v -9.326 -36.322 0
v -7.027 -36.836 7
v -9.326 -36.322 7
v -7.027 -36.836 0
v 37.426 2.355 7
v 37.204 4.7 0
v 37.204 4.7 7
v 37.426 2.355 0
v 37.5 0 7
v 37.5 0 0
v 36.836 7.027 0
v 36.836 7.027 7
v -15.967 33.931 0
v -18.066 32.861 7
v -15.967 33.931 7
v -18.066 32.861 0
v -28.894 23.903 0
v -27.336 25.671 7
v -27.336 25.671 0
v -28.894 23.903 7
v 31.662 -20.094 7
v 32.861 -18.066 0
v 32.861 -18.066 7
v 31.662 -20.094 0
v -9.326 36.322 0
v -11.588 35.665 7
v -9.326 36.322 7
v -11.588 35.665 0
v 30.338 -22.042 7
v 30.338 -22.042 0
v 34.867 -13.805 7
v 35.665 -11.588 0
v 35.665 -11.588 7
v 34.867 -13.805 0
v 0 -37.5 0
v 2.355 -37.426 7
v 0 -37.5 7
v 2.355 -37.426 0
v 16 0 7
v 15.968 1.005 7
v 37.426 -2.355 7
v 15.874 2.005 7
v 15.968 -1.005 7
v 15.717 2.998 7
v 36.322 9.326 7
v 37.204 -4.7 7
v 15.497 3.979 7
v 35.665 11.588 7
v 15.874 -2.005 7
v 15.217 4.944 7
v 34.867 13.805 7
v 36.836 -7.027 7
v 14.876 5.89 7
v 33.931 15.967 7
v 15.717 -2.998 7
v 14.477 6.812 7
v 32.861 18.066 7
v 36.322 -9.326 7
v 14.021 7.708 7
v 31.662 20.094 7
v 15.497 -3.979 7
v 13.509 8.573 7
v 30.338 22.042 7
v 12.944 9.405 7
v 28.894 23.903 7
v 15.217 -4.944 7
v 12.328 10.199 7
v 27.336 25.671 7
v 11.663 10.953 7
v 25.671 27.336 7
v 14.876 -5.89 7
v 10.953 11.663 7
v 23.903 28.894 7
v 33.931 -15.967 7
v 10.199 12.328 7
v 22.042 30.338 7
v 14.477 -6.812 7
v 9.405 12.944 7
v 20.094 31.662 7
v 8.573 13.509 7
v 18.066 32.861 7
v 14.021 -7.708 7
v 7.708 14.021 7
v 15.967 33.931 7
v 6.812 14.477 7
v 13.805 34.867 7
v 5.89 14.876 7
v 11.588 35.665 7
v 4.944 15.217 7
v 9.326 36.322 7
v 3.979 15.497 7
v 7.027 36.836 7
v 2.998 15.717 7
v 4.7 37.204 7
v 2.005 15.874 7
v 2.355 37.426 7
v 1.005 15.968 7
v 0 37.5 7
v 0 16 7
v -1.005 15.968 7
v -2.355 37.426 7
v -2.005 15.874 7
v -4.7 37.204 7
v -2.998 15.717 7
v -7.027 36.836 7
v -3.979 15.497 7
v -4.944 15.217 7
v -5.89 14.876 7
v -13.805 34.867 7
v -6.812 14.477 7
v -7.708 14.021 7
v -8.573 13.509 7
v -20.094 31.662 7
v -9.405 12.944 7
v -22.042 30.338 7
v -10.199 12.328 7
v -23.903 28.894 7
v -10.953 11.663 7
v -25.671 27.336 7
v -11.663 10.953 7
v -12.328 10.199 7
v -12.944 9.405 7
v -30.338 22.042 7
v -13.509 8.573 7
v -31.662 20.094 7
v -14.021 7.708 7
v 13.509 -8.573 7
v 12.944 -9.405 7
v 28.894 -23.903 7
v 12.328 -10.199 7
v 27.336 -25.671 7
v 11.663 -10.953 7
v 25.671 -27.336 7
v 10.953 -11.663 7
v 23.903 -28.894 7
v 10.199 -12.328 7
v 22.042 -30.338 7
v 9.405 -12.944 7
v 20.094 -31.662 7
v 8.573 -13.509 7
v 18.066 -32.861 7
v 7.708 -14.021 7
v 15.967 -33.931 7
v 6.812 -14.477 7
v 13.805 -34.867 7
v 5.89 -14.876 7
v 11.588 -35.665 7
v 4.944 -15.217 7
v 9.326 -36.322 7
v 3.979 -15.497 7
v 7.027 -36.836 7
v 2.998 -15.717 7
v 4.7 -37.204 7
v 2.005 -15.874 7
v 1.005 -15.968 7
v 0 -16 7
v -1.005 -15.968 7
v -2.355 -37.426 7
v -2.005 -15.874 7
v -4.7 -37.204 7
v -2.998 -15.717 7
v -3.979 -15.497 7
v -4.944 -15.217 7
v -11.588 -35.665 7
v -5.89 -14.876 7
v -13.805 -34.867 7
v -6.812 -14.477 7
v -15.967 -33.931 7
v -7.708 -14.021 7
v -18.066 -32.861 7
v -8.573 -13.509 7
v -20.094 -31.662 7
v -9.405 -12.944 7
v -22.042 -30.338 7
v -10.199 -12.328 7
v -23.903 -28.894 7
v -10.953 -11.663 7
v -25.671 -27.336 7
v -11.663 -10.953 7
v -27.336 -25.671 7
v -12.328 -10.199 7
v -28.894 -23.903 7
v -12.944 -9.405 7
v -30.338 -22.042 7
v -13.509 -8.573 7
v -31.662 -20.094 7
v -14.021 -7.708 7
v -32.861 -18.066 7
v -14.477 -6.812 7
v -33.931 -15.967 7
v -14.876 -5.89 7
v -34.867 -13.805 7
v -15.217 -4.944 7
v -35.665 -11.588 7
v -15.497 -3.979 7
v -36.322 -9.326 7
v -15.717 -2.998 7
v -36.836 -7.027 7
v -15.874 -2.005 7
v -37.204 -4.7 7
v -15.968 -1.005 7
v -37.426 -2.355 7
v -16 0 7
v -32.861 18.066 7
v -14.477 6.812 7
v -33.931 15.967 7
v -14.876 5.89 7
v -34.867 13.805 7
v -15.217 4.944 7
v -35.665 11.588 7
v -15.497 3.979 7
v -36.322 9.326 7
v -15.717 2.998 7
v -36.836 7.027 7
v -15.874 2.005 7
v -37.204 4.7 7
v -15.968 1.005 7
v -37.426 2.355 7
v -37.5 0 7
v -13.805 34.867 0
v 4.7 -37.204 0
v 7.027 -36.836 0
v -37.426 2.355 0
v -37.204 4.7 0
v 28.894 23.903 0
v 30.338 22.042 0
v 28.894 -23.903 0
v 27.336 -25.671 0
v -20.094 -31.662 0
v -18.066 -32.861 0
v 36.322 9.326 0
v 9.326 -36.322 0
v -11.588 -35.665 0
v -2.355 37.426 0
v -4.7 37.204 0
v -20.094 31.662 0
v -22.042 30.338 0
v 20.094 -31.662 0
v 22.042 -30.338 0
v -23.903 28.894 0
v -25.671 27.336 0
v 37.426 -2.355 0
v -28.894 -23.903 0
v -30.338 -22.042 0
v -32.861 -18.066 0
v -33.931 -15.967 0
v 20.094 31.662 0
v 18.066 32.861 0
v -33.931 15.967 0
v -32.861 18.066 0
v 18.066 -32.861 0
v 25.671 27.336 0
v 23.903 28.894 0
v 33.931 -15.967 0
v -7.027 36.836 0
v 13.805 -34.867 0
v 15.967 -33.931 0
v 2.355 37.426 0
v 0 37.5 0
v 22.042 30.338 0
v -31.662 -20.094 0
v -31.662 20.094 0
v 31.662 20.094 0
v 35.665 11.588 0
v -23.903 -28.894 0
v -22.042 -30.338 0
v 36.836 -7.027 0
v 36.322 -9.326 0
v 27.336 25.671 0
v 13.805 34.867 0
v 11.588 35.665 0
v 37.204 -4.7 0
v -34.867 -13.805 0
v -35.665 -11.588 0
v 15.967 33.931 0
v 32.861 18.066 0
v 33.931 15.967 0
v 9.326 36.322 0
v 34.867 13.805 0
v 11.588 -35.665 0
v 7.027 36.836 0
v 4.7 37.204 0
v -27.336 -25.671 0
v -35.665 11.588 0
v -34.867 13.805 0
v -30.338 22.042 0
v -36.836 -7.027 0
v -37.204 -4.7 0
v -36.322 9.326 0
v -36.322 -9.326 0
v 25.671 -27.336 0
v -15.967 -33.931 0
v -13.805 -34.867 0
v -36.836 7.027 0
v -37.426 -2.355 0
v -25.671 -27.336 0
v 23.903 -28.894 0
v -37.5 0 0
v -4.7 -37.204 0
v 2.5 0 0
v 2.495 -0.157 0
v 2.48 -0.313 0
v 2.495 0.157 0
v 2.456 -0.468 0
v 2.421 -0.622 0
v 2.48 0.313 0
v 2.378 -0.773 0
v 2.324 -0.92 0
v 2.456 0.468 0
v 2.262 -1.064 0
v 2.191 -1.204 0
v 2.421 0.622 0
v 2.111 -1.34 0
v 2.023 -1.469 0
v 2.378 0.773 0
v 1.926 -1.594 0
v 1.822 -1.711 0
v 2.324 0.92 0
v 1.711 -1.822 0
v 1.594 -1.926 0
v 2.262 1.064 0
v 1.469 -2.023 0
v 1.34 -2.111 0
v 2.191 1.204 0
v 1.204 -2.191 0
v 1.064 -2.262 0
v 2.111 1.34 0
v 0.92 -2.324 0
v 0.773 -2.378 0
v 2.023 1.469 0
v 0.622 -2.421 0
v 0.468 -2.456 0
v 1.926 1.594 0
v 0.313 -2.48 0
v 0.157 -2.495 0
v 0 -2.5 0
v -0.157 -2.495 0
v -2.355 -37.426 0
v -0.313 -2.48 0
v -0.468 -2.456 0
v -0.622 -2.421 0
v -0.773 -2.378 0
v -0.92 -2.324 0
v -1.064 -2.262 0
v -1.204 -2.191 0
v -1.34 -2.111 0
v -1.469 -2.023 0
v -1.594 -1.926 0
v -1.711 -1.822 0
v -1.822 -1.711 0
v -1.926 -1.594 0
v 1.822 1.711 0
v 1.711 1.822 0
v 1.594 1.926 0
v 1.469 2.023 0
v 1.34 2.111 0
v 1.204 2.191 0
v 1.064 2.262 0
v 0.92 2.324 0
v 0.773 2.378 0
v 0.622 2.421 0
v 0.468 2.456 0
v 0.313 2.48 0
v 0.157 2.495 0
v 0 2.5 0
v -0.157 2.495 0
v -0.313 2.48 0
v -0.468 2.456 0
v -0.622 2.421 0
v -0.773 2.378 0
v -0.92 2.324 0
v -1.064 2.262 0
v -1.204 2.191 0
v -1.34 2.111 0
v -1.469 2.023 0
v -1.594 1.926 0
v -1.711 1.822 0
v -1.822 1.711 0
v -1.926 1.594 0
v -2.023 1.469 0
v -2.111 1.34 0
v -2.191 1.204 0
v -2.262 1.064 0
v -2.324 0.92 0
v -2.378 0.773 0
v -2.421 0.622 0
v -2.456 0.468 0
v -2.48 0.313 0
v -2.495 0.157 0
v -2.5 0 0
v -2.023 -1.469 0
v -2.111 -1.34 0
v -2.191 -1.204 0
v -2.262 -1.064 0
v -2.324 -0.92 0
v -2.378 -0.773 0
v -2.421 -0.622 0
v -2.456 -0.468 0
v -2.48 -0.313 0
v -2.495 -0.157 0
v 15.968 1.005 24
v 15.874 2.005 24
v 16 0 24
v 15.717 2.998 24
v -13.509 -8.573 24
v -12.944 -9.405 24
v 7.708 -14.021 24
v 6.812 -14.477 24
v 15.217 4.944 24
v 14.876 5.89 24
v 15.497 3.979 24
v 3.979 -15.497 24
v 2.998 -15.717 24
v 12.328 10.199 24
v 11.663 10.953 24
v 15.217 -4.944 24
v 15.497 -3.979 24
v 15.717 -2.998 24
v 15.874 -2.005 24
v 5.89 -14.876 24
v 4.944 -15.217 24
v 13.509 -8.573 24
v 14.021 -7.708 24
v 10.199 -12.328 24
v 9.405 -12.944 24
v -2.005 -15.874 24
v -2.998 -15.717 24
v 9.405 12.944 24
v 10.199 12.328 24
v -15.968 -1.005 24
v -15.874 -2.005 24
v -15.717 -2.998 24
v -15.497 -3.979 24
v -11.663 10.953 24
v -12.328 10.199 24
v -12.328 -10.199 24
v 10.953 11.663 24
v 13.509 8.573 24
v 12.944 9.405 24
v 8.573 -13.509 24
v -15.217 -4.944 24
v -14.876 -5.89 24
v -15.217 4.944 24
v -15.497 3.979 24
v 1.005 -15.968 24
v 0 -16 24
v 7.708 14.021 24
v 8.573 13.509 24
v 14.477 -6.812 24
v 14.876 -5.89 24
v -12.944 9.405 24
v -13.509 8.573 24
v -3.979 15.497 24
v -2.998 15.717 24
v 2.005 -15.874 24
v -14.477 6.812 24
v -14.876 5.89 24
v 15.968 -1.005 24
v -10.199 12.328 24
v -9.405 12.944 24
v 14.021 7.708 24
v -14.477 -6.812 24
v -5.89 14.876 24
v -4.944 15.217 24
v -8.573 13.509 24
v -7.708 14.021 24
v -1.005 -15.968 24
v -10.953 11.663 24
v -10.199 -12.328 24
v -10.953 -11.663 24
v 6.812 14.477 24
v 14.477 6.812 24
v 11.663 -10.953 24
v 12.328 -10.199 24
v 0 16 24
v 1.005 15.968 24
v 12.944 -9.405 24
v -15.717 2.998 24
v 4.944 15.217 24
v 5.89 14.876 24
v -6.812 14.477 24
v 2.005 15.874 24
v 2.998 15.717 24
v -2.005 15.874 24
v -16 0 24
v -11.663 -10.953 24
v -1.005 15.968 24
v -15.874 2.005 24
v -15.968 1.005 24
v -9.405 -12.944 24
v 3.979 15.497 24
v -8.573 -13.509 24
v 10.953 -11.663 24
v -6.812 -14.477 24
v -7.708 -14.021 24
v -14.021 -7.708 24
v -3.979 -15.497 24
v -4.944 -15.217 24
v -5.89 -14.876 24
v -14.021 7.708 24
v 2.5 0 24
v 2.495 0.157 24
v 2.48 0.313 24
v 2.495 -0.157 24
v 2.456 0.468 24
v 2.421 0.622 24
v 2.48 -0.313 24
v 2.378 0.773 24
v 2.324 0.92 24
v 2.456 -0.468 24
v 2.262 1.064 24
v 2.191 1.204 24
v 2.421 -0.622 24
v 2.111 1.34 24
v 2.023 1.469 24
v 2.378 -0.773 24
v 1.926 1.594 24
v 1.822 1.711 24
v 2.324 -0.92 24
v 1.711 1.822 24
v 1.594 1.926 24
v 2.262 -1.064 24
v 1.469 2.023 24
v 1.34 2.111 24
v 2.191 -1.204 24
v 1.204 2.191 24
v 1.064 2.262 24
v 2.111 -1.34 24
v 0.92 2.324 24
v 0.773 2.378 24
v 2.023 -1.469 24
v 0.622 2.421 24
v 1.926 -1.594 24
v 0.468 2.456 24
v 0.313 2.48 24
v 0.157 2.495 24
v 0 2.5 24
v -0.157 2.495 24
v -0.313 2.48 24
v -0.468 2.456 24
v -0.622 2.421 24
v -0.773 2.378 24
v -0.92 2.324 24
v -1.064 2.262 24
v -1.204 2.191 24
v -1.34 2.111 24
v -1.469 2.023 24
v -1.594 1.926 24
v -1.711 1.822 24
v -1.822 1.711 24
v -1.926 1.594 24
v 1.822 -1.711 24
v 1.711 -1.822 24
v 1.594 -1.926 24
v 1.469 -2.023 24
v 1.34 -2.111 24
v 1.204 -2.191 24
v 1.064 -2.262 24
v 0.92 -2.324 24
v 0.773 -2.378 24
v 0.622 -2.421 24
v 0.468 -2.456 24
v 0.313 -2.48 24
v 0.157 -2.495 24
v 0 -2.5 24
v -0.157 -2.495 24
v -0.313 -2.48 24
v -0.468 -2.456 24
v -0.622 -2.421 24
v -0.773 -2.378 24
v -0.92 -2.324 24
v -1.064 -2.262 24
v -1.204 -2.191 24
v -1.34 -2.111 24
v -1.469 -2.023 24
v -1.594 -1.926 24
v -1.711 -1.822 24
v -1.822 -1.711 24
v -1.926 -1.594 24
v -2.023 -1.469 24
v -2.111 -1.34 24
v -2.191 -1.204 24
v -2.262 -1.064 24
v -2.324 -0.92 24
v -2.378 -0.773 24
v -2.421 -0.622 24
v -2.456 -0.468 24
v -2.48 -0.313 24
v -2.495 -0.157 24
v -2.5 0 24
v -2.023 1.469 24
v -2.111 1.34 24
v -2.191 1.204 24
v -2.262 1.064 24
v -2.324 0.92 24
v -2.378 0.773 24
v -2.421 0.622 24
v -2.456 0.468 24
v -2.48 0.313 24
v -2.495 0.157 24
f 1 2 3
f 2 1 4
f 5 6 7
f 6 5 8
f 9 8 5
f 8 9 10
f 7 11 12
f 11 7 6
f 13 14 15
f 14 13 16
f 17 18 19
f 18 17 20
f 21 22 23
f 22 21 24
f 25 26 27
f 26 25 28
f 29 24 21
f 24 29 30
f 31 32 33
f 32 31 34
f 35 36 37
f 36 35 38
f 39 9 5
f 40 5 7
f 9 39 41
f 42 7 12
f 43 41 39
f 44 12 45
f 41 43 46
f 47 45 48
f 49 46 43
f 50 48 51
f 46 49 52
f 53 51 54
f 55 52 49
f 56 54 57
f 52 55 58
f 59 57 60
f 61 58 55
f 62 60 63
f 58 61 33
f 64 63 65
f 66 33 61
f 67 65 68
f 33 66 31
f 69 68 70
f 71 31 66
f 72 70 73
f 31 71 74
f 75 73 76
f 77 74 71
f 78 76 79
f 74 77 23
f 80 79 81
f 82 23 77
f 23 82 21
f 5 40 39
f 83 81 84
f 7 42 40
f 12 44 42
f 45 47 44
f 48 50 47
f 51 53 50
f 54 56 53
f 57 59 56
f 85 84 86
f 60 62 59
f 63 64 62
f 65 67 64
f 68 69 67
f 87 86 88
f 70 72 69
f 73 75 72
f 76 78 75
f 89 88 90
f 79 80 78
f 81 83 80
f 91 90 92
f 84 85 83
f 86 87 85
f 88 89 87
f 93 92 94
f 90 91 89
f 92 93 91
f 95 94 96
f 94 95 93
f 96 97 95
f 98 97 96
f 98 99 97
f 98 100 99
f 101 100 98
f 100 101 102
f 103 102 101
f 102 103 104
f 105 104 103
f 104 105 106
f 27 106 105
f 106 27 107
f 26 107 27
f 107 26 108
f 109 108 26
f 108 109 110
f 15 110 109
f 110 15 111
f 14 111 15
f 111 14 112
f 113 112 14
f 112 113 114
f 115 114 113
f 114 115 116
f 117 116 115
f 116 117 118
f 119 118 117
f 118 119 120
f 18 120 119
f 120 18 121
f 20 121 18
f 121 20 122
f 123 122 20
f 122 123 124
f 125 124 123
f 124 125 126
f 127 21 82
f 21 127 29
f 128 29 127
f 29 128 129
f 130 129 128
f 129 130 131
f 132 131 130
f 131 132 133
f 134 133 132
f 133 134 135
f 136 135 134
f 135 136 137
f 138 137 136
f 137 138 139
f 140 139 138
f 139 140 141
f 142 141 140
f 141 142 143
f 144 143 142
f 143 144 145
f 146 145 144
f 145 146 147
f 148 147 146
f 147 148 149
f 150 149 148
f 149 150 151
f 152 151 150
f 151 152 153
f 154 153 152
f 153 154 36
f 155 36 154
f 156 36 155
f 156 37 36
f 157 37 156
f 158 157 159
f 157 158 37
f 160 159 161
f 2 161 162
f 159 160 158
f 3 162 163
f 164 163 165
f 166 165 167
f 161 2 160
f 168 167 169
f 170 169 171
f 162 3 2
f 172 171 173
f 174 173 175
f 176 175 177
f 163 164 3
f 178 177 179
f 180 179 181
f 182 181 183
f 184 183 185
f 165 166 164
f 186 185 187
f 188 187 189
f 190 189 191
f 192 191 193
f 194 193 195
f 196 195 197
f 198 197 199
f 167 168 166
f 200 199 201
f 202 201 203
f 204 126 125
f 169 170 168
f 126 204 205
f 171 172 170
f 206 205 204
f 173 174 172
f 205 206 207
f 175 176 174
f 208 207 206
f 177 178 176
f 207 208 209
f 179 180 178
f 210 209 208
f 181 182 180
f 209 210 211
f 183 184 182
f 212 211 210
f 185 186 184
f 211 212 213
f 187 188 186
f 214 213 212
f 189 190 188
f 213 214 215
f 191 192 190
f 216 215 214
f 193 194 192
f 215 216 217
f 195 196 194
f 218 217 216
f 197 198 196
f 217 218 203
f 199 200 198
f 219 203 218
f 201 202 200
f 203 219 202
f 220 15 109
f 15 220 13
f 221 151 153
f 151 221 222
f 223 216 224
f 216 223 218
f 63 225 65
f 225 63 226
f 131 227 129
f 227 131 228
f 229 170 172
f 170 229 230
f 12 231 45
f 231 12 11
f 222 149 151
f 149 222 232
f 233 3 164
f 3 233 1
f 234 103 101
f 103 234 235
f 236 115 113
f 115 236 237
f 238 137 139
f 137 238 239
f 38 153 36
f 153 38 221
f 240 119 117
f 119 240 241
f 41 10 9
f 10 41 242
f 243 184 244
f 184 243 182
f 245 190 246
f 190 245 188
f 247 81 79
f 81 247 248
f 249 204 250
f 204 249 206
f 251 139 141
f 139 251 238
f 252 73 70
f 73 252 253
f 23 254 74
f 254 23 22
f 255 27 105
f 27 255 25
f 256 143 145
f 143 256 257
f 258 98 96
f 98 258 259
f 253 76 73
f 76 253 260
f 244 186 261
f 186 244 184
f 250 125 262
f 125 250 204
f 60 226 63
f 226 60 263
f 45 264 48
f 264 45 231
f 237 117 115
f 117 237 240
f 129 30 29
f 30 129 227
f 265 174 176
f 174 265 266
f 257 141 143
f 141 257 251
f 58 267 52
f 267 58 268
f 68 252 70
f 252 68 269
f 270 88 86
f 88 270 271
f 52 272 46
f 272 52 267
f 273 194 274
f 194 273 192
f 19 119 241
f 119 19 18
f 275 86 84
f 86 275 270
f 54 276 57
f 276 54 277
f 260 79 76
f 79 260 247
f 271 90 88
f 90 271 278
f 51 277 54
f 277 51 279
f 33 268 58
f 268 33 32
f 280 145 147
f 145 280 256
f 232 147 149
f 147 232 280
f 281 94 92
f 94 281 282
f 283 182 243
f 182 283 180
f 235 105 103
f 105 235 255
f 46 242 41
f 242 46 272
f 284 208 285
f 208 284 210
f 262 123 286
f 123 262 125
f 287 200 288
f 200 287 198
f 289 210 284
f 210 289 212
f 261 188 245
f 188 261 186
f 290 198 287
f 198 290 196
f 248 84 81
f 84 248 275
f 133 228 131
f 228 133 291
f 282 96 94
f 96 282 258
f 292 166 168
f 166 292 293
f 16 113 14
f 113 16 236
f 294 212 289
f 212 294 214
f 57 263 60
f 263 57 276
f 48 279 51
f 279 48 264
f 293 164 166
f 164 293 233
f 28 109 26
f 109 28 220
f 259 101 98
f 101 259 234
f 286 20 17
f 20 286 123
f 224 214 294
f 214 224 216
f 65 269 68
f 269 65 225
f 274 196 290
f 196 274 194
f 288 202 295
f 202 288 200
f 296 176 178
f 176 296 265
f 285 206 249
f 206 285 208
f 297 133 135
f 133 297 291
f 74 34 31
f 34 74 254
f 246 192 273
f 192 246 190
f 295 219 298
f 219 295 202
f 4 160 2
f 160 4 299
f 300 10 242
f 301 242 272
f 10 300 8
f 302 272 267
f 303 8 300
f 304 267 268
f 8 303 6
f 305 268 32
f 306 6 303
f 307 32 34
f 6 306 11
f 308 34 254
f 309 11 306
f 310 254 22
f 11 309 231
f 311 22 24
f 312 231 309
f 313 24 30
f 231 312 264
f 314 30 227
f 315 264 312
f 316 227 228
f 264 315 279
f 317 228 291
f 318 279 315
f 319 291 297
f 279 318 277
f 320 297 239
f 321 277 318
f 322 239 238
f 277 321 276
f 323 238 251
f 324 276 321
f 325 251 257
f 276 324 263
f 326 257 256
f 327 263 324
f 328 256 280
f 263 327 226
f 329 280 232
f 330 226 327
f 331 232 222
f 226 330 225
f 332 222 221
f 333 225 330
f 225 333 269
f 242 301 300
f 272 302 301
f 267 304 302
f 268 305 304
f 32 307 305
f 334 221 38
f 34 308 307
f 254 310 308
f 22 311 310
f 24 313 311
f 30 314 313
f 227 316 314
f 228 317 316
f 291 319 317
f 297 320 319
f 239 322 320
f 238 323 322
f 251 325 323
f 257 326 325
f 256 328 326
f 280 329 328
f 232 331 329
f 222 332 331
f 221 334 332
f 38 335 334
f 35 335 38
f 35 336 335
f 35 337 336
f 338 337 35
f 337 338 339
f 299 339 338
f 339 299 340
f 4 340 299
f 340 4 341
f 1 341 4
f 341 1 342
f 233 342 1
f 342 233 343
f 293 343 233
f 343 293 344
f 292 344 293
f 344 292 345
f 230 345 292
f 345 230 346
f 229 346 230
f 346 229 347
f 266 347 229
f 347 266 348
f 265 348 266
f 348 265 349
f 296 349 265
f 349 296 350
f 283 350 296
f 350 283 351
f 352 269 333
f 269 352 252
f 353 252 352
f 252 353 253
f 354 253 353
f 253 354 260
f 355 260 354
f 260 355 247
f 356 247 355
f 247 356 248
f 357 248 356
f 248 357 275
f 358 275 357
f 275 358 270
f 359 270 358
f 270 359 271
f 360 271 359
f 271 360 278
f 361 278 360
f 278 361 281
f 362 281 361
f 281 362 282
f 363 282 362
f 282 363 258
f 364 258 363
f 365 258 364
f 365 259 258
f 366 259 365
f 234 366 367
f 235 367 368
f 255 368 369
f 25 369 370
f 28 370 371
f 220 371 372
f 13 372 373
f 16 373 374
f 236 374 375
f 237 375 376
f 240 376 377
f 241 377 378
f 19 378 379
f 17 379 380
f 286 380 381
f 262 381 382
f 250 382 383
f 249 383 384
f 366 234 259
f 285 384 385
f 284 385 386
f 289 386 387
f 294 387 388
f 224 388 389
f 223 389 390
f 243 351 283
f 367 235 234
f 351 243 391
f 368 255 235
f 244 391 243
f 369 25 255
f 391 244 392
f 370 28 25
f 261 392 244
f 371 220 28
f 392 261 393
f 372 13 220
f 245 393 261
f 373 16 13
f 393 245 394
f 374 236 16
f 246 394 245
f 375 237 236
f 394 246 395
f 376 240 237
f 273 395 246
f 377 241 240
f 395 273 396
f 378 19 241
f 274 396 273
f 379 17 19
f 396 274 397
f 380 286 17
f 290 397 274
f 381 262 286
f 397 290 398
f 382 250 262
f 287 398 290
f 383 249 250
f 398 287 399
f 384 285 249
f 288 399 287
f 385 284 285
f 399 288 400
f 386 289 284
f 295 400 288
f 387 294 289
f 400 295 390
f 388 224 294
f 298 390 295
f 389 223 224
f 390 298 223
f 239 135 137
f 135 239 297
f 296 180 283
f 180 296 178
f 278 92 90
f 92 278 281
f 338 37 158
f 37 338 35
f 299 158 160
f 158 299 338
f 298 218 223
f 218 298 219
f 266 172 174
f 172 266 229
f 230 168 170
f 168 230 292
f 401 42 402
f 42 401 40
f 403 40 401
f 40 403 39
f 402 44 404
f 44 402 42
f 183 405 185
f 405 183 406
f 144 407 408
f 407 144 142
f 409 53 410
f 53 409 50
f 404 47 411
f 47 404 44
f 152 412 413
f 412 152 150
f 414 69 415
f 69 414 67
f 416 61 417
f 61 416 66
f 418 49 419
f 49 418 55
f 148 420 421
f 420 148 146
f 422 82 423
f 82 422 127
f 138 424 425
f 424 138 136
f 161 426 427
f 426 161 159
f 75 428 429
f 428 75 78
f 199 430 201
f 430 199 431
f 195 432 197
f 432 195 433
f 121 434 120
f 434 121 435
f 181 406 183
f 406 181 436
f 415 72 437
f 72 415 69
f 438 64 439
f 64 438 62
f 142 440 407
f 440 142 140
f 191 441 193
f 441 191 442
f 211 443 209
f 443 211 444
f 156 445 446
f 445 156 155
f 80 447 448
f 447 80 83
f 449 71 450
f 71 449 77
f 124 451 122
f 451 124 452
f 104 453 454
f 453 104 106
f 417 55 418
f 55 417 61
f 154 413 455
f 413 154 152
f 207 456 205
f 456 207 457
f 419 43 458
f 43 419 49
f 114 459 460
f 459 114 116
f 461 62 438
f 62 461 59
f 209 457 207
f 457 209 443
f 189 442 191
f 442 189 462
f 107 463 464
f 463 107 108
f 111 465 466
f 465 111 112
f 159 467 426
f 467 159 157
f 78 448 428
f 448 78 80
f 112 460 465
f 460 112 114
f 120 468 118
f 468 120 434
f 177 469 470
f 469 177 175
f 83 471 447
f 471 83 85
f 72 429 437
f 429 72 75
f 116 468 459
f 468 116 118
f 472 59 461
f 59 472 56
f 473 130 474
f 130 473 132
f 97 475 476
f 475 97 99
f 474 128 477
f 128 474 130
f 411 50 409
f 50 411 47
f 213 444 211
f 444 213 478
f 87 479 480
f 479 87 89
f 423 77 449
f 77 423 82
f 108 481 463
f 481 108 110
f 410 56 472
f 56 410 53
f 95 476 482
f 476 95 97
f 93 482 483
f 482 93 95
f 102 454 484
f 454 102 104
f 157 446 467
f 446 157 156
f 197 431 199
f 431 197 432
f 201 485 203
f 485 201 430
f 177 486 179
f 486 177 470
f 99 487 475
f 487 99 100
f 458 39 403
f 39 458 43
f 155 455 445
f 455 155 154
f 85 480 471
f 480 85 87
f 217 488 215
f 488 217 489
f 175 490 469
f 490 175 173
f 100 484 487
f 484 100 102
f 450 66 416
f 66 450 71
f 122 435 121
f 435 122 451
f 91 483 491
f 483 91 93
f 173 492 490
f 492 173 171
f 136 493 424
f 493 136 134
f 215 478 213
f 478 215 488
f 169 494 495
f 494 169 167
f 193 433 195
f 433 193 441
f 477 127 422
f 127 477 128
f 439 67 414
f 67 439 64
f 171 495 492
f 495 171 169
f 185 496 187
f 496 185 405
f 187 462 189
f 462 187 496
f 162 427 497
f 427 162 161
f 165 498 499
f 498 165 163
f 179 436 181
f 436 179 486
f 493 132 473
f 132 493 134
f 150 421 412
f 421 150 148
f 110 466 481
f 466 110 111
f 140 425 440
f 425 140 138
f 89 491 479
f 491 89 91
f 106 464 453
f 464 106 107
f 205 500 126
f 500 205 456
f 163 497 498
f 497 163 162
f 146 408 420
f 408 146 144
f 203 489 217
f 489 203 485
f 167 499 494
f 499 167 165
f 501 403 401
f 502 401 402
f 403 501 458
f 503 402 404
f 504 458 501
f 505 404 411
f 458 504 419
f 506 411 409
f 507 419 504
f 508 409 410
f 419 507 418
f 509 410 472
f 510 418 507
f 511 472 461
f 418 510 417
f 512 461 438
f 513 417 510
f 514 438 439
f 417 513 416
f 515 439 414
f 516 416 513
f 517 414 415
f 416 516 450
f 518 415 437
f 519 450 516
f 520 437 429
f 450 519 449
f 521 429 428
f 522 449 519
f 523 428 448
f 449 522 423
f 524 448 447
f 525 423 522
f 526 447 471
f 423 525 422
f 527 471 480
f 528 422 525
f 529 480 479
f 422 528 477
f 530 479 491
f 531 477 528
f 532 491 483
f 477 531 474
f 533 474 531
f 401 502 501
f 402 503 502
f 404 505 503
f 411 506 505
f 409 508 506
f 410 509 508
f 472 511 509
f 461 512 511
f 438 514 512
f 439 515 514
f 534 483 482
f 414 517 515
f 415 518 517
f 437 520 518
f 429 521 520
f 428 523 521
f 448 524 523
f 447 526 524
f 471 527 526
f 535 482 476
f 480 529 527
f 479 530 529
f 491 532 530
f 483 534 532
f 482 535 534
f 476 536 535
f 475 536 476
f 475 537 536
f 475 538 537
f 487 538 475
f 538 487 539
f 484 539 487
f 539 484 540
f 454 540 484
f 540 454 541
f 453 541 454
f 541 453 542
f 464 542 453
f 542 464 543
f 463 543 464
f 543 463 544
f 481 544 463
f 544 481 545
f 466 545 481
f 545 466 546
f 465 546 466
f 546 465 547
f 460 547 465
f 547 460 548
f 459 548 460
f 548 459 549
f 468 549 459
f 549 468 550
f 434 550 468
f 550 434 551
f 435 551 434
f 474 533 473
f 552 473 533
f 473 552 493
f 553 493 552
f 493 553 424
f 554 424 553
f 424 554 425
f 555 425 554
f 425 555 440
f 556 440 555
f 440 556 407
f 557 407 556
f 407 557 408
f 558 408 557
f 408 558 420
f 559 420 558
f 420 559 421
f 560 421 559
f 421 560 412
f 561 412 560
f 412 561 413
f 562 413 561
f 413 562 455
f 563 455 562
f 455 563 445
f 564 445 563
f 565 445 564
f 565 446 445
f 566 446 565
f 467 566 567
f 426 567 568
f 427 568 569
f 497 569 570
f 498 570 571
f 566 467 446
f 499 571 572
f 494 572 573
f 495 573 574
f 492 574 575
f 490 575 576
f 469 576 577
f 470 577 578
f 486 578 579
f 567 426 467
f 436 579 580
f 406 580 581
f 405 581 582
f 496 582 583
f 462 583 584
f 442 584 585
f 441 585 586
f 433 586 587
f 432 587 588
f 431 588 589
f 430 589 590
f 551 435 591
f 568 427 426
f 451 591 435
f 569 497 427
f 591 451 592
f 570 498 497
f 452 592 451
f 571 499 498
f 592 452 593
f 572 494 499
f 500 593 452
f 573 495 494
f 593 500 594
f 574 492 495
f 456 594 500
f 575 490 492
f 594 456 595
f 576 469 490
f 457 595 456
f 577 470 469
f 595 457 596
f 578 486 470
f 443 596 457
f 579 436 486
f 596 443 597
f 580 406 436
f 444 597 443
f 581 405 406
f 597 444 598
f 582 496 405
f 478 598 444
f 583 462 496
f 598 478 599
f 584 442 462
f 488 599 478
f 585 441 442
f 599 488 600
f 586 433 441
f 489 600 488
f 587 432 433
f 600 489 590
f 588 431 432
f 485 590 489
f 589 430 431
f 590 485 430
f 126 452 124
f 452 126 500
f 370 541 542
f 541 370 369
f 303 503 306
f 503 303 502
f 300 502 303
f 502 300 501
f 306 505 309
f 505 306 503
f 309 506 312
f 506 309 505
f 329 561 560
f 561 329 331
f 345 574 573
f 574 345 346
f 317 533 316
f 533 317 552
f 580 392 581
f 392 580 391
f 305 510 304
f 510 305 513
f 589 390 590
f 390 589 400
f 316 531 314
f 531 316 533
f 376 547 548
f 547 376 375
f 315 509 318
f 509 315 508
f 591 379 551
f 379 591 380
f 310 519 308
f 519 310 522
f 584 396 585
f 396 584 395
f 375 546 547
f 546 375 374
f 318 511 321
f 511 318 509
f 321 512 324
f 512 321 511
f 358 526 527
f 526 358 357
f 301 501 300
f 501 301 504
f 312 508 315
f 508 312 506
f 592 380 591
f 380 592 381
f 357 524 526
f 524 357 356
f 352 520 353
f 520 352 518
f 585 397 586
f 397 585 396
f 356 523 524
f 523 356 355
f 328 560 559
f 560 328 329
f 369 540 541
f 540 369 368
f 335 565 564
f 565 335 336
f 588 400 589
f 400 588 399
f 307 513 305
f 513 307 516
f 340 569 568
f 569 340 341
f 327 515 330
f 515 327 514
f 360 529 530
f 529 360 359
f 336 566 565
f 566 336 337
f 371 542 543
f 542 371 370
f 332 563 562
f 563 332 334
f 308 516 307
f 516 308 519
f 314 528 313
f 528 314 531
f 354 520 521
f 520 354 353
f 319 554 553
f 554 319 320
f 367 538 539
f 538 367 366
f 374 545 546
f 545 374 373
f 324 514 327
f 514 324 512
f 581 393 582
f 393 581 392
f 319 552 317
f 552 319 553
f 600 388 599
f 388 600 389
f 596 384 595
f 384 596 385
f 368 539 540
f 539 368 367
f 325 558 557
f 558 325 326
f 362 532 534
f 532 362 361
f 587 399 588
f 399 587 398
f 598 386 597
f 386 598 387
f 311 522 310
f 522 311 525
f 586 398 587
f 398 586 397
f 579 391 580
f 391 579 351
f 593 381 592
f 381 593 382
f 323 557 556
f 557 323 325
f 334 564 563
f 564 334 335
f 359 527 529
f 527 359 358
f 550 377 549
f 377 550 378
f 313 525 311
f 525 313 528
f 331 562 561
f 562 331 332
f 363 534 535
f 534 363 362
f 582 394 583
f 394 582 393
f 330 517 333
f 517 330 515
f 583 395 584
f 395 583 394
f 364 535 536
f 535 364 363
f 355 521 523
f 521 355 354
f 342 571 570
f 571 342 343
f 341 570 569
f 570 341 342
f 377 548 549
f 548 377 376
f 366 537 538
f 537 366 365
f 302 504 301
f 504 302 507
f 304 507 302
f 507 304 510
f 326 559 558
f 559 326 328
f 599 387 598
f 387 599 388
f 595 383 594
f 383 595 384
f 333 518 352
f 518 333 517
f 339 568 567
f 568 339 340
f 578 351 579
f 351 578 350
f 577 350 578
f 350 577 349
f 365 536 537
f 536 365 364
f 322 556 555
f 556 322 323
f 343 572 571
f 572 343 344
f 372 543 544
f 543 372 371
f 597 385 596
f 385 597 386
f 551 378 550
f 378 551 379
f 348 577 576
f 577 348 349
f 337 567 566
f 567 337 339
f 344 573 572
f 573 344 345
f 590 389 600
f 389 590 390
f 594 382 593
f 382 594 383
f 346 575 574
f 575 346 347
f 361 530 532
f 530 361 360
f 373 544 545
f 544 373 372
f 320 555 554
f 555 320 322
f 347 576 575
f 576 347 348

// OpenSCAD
module base() {
    cylinder(h = 7, d = 75, center = false, $fn=100);
    cylinder(h = 24, d = 32, center = false, $fn=100);
}

difference() {
    base();
    cylinder(h=80, d = 5, center = true, $fn=100);
}
